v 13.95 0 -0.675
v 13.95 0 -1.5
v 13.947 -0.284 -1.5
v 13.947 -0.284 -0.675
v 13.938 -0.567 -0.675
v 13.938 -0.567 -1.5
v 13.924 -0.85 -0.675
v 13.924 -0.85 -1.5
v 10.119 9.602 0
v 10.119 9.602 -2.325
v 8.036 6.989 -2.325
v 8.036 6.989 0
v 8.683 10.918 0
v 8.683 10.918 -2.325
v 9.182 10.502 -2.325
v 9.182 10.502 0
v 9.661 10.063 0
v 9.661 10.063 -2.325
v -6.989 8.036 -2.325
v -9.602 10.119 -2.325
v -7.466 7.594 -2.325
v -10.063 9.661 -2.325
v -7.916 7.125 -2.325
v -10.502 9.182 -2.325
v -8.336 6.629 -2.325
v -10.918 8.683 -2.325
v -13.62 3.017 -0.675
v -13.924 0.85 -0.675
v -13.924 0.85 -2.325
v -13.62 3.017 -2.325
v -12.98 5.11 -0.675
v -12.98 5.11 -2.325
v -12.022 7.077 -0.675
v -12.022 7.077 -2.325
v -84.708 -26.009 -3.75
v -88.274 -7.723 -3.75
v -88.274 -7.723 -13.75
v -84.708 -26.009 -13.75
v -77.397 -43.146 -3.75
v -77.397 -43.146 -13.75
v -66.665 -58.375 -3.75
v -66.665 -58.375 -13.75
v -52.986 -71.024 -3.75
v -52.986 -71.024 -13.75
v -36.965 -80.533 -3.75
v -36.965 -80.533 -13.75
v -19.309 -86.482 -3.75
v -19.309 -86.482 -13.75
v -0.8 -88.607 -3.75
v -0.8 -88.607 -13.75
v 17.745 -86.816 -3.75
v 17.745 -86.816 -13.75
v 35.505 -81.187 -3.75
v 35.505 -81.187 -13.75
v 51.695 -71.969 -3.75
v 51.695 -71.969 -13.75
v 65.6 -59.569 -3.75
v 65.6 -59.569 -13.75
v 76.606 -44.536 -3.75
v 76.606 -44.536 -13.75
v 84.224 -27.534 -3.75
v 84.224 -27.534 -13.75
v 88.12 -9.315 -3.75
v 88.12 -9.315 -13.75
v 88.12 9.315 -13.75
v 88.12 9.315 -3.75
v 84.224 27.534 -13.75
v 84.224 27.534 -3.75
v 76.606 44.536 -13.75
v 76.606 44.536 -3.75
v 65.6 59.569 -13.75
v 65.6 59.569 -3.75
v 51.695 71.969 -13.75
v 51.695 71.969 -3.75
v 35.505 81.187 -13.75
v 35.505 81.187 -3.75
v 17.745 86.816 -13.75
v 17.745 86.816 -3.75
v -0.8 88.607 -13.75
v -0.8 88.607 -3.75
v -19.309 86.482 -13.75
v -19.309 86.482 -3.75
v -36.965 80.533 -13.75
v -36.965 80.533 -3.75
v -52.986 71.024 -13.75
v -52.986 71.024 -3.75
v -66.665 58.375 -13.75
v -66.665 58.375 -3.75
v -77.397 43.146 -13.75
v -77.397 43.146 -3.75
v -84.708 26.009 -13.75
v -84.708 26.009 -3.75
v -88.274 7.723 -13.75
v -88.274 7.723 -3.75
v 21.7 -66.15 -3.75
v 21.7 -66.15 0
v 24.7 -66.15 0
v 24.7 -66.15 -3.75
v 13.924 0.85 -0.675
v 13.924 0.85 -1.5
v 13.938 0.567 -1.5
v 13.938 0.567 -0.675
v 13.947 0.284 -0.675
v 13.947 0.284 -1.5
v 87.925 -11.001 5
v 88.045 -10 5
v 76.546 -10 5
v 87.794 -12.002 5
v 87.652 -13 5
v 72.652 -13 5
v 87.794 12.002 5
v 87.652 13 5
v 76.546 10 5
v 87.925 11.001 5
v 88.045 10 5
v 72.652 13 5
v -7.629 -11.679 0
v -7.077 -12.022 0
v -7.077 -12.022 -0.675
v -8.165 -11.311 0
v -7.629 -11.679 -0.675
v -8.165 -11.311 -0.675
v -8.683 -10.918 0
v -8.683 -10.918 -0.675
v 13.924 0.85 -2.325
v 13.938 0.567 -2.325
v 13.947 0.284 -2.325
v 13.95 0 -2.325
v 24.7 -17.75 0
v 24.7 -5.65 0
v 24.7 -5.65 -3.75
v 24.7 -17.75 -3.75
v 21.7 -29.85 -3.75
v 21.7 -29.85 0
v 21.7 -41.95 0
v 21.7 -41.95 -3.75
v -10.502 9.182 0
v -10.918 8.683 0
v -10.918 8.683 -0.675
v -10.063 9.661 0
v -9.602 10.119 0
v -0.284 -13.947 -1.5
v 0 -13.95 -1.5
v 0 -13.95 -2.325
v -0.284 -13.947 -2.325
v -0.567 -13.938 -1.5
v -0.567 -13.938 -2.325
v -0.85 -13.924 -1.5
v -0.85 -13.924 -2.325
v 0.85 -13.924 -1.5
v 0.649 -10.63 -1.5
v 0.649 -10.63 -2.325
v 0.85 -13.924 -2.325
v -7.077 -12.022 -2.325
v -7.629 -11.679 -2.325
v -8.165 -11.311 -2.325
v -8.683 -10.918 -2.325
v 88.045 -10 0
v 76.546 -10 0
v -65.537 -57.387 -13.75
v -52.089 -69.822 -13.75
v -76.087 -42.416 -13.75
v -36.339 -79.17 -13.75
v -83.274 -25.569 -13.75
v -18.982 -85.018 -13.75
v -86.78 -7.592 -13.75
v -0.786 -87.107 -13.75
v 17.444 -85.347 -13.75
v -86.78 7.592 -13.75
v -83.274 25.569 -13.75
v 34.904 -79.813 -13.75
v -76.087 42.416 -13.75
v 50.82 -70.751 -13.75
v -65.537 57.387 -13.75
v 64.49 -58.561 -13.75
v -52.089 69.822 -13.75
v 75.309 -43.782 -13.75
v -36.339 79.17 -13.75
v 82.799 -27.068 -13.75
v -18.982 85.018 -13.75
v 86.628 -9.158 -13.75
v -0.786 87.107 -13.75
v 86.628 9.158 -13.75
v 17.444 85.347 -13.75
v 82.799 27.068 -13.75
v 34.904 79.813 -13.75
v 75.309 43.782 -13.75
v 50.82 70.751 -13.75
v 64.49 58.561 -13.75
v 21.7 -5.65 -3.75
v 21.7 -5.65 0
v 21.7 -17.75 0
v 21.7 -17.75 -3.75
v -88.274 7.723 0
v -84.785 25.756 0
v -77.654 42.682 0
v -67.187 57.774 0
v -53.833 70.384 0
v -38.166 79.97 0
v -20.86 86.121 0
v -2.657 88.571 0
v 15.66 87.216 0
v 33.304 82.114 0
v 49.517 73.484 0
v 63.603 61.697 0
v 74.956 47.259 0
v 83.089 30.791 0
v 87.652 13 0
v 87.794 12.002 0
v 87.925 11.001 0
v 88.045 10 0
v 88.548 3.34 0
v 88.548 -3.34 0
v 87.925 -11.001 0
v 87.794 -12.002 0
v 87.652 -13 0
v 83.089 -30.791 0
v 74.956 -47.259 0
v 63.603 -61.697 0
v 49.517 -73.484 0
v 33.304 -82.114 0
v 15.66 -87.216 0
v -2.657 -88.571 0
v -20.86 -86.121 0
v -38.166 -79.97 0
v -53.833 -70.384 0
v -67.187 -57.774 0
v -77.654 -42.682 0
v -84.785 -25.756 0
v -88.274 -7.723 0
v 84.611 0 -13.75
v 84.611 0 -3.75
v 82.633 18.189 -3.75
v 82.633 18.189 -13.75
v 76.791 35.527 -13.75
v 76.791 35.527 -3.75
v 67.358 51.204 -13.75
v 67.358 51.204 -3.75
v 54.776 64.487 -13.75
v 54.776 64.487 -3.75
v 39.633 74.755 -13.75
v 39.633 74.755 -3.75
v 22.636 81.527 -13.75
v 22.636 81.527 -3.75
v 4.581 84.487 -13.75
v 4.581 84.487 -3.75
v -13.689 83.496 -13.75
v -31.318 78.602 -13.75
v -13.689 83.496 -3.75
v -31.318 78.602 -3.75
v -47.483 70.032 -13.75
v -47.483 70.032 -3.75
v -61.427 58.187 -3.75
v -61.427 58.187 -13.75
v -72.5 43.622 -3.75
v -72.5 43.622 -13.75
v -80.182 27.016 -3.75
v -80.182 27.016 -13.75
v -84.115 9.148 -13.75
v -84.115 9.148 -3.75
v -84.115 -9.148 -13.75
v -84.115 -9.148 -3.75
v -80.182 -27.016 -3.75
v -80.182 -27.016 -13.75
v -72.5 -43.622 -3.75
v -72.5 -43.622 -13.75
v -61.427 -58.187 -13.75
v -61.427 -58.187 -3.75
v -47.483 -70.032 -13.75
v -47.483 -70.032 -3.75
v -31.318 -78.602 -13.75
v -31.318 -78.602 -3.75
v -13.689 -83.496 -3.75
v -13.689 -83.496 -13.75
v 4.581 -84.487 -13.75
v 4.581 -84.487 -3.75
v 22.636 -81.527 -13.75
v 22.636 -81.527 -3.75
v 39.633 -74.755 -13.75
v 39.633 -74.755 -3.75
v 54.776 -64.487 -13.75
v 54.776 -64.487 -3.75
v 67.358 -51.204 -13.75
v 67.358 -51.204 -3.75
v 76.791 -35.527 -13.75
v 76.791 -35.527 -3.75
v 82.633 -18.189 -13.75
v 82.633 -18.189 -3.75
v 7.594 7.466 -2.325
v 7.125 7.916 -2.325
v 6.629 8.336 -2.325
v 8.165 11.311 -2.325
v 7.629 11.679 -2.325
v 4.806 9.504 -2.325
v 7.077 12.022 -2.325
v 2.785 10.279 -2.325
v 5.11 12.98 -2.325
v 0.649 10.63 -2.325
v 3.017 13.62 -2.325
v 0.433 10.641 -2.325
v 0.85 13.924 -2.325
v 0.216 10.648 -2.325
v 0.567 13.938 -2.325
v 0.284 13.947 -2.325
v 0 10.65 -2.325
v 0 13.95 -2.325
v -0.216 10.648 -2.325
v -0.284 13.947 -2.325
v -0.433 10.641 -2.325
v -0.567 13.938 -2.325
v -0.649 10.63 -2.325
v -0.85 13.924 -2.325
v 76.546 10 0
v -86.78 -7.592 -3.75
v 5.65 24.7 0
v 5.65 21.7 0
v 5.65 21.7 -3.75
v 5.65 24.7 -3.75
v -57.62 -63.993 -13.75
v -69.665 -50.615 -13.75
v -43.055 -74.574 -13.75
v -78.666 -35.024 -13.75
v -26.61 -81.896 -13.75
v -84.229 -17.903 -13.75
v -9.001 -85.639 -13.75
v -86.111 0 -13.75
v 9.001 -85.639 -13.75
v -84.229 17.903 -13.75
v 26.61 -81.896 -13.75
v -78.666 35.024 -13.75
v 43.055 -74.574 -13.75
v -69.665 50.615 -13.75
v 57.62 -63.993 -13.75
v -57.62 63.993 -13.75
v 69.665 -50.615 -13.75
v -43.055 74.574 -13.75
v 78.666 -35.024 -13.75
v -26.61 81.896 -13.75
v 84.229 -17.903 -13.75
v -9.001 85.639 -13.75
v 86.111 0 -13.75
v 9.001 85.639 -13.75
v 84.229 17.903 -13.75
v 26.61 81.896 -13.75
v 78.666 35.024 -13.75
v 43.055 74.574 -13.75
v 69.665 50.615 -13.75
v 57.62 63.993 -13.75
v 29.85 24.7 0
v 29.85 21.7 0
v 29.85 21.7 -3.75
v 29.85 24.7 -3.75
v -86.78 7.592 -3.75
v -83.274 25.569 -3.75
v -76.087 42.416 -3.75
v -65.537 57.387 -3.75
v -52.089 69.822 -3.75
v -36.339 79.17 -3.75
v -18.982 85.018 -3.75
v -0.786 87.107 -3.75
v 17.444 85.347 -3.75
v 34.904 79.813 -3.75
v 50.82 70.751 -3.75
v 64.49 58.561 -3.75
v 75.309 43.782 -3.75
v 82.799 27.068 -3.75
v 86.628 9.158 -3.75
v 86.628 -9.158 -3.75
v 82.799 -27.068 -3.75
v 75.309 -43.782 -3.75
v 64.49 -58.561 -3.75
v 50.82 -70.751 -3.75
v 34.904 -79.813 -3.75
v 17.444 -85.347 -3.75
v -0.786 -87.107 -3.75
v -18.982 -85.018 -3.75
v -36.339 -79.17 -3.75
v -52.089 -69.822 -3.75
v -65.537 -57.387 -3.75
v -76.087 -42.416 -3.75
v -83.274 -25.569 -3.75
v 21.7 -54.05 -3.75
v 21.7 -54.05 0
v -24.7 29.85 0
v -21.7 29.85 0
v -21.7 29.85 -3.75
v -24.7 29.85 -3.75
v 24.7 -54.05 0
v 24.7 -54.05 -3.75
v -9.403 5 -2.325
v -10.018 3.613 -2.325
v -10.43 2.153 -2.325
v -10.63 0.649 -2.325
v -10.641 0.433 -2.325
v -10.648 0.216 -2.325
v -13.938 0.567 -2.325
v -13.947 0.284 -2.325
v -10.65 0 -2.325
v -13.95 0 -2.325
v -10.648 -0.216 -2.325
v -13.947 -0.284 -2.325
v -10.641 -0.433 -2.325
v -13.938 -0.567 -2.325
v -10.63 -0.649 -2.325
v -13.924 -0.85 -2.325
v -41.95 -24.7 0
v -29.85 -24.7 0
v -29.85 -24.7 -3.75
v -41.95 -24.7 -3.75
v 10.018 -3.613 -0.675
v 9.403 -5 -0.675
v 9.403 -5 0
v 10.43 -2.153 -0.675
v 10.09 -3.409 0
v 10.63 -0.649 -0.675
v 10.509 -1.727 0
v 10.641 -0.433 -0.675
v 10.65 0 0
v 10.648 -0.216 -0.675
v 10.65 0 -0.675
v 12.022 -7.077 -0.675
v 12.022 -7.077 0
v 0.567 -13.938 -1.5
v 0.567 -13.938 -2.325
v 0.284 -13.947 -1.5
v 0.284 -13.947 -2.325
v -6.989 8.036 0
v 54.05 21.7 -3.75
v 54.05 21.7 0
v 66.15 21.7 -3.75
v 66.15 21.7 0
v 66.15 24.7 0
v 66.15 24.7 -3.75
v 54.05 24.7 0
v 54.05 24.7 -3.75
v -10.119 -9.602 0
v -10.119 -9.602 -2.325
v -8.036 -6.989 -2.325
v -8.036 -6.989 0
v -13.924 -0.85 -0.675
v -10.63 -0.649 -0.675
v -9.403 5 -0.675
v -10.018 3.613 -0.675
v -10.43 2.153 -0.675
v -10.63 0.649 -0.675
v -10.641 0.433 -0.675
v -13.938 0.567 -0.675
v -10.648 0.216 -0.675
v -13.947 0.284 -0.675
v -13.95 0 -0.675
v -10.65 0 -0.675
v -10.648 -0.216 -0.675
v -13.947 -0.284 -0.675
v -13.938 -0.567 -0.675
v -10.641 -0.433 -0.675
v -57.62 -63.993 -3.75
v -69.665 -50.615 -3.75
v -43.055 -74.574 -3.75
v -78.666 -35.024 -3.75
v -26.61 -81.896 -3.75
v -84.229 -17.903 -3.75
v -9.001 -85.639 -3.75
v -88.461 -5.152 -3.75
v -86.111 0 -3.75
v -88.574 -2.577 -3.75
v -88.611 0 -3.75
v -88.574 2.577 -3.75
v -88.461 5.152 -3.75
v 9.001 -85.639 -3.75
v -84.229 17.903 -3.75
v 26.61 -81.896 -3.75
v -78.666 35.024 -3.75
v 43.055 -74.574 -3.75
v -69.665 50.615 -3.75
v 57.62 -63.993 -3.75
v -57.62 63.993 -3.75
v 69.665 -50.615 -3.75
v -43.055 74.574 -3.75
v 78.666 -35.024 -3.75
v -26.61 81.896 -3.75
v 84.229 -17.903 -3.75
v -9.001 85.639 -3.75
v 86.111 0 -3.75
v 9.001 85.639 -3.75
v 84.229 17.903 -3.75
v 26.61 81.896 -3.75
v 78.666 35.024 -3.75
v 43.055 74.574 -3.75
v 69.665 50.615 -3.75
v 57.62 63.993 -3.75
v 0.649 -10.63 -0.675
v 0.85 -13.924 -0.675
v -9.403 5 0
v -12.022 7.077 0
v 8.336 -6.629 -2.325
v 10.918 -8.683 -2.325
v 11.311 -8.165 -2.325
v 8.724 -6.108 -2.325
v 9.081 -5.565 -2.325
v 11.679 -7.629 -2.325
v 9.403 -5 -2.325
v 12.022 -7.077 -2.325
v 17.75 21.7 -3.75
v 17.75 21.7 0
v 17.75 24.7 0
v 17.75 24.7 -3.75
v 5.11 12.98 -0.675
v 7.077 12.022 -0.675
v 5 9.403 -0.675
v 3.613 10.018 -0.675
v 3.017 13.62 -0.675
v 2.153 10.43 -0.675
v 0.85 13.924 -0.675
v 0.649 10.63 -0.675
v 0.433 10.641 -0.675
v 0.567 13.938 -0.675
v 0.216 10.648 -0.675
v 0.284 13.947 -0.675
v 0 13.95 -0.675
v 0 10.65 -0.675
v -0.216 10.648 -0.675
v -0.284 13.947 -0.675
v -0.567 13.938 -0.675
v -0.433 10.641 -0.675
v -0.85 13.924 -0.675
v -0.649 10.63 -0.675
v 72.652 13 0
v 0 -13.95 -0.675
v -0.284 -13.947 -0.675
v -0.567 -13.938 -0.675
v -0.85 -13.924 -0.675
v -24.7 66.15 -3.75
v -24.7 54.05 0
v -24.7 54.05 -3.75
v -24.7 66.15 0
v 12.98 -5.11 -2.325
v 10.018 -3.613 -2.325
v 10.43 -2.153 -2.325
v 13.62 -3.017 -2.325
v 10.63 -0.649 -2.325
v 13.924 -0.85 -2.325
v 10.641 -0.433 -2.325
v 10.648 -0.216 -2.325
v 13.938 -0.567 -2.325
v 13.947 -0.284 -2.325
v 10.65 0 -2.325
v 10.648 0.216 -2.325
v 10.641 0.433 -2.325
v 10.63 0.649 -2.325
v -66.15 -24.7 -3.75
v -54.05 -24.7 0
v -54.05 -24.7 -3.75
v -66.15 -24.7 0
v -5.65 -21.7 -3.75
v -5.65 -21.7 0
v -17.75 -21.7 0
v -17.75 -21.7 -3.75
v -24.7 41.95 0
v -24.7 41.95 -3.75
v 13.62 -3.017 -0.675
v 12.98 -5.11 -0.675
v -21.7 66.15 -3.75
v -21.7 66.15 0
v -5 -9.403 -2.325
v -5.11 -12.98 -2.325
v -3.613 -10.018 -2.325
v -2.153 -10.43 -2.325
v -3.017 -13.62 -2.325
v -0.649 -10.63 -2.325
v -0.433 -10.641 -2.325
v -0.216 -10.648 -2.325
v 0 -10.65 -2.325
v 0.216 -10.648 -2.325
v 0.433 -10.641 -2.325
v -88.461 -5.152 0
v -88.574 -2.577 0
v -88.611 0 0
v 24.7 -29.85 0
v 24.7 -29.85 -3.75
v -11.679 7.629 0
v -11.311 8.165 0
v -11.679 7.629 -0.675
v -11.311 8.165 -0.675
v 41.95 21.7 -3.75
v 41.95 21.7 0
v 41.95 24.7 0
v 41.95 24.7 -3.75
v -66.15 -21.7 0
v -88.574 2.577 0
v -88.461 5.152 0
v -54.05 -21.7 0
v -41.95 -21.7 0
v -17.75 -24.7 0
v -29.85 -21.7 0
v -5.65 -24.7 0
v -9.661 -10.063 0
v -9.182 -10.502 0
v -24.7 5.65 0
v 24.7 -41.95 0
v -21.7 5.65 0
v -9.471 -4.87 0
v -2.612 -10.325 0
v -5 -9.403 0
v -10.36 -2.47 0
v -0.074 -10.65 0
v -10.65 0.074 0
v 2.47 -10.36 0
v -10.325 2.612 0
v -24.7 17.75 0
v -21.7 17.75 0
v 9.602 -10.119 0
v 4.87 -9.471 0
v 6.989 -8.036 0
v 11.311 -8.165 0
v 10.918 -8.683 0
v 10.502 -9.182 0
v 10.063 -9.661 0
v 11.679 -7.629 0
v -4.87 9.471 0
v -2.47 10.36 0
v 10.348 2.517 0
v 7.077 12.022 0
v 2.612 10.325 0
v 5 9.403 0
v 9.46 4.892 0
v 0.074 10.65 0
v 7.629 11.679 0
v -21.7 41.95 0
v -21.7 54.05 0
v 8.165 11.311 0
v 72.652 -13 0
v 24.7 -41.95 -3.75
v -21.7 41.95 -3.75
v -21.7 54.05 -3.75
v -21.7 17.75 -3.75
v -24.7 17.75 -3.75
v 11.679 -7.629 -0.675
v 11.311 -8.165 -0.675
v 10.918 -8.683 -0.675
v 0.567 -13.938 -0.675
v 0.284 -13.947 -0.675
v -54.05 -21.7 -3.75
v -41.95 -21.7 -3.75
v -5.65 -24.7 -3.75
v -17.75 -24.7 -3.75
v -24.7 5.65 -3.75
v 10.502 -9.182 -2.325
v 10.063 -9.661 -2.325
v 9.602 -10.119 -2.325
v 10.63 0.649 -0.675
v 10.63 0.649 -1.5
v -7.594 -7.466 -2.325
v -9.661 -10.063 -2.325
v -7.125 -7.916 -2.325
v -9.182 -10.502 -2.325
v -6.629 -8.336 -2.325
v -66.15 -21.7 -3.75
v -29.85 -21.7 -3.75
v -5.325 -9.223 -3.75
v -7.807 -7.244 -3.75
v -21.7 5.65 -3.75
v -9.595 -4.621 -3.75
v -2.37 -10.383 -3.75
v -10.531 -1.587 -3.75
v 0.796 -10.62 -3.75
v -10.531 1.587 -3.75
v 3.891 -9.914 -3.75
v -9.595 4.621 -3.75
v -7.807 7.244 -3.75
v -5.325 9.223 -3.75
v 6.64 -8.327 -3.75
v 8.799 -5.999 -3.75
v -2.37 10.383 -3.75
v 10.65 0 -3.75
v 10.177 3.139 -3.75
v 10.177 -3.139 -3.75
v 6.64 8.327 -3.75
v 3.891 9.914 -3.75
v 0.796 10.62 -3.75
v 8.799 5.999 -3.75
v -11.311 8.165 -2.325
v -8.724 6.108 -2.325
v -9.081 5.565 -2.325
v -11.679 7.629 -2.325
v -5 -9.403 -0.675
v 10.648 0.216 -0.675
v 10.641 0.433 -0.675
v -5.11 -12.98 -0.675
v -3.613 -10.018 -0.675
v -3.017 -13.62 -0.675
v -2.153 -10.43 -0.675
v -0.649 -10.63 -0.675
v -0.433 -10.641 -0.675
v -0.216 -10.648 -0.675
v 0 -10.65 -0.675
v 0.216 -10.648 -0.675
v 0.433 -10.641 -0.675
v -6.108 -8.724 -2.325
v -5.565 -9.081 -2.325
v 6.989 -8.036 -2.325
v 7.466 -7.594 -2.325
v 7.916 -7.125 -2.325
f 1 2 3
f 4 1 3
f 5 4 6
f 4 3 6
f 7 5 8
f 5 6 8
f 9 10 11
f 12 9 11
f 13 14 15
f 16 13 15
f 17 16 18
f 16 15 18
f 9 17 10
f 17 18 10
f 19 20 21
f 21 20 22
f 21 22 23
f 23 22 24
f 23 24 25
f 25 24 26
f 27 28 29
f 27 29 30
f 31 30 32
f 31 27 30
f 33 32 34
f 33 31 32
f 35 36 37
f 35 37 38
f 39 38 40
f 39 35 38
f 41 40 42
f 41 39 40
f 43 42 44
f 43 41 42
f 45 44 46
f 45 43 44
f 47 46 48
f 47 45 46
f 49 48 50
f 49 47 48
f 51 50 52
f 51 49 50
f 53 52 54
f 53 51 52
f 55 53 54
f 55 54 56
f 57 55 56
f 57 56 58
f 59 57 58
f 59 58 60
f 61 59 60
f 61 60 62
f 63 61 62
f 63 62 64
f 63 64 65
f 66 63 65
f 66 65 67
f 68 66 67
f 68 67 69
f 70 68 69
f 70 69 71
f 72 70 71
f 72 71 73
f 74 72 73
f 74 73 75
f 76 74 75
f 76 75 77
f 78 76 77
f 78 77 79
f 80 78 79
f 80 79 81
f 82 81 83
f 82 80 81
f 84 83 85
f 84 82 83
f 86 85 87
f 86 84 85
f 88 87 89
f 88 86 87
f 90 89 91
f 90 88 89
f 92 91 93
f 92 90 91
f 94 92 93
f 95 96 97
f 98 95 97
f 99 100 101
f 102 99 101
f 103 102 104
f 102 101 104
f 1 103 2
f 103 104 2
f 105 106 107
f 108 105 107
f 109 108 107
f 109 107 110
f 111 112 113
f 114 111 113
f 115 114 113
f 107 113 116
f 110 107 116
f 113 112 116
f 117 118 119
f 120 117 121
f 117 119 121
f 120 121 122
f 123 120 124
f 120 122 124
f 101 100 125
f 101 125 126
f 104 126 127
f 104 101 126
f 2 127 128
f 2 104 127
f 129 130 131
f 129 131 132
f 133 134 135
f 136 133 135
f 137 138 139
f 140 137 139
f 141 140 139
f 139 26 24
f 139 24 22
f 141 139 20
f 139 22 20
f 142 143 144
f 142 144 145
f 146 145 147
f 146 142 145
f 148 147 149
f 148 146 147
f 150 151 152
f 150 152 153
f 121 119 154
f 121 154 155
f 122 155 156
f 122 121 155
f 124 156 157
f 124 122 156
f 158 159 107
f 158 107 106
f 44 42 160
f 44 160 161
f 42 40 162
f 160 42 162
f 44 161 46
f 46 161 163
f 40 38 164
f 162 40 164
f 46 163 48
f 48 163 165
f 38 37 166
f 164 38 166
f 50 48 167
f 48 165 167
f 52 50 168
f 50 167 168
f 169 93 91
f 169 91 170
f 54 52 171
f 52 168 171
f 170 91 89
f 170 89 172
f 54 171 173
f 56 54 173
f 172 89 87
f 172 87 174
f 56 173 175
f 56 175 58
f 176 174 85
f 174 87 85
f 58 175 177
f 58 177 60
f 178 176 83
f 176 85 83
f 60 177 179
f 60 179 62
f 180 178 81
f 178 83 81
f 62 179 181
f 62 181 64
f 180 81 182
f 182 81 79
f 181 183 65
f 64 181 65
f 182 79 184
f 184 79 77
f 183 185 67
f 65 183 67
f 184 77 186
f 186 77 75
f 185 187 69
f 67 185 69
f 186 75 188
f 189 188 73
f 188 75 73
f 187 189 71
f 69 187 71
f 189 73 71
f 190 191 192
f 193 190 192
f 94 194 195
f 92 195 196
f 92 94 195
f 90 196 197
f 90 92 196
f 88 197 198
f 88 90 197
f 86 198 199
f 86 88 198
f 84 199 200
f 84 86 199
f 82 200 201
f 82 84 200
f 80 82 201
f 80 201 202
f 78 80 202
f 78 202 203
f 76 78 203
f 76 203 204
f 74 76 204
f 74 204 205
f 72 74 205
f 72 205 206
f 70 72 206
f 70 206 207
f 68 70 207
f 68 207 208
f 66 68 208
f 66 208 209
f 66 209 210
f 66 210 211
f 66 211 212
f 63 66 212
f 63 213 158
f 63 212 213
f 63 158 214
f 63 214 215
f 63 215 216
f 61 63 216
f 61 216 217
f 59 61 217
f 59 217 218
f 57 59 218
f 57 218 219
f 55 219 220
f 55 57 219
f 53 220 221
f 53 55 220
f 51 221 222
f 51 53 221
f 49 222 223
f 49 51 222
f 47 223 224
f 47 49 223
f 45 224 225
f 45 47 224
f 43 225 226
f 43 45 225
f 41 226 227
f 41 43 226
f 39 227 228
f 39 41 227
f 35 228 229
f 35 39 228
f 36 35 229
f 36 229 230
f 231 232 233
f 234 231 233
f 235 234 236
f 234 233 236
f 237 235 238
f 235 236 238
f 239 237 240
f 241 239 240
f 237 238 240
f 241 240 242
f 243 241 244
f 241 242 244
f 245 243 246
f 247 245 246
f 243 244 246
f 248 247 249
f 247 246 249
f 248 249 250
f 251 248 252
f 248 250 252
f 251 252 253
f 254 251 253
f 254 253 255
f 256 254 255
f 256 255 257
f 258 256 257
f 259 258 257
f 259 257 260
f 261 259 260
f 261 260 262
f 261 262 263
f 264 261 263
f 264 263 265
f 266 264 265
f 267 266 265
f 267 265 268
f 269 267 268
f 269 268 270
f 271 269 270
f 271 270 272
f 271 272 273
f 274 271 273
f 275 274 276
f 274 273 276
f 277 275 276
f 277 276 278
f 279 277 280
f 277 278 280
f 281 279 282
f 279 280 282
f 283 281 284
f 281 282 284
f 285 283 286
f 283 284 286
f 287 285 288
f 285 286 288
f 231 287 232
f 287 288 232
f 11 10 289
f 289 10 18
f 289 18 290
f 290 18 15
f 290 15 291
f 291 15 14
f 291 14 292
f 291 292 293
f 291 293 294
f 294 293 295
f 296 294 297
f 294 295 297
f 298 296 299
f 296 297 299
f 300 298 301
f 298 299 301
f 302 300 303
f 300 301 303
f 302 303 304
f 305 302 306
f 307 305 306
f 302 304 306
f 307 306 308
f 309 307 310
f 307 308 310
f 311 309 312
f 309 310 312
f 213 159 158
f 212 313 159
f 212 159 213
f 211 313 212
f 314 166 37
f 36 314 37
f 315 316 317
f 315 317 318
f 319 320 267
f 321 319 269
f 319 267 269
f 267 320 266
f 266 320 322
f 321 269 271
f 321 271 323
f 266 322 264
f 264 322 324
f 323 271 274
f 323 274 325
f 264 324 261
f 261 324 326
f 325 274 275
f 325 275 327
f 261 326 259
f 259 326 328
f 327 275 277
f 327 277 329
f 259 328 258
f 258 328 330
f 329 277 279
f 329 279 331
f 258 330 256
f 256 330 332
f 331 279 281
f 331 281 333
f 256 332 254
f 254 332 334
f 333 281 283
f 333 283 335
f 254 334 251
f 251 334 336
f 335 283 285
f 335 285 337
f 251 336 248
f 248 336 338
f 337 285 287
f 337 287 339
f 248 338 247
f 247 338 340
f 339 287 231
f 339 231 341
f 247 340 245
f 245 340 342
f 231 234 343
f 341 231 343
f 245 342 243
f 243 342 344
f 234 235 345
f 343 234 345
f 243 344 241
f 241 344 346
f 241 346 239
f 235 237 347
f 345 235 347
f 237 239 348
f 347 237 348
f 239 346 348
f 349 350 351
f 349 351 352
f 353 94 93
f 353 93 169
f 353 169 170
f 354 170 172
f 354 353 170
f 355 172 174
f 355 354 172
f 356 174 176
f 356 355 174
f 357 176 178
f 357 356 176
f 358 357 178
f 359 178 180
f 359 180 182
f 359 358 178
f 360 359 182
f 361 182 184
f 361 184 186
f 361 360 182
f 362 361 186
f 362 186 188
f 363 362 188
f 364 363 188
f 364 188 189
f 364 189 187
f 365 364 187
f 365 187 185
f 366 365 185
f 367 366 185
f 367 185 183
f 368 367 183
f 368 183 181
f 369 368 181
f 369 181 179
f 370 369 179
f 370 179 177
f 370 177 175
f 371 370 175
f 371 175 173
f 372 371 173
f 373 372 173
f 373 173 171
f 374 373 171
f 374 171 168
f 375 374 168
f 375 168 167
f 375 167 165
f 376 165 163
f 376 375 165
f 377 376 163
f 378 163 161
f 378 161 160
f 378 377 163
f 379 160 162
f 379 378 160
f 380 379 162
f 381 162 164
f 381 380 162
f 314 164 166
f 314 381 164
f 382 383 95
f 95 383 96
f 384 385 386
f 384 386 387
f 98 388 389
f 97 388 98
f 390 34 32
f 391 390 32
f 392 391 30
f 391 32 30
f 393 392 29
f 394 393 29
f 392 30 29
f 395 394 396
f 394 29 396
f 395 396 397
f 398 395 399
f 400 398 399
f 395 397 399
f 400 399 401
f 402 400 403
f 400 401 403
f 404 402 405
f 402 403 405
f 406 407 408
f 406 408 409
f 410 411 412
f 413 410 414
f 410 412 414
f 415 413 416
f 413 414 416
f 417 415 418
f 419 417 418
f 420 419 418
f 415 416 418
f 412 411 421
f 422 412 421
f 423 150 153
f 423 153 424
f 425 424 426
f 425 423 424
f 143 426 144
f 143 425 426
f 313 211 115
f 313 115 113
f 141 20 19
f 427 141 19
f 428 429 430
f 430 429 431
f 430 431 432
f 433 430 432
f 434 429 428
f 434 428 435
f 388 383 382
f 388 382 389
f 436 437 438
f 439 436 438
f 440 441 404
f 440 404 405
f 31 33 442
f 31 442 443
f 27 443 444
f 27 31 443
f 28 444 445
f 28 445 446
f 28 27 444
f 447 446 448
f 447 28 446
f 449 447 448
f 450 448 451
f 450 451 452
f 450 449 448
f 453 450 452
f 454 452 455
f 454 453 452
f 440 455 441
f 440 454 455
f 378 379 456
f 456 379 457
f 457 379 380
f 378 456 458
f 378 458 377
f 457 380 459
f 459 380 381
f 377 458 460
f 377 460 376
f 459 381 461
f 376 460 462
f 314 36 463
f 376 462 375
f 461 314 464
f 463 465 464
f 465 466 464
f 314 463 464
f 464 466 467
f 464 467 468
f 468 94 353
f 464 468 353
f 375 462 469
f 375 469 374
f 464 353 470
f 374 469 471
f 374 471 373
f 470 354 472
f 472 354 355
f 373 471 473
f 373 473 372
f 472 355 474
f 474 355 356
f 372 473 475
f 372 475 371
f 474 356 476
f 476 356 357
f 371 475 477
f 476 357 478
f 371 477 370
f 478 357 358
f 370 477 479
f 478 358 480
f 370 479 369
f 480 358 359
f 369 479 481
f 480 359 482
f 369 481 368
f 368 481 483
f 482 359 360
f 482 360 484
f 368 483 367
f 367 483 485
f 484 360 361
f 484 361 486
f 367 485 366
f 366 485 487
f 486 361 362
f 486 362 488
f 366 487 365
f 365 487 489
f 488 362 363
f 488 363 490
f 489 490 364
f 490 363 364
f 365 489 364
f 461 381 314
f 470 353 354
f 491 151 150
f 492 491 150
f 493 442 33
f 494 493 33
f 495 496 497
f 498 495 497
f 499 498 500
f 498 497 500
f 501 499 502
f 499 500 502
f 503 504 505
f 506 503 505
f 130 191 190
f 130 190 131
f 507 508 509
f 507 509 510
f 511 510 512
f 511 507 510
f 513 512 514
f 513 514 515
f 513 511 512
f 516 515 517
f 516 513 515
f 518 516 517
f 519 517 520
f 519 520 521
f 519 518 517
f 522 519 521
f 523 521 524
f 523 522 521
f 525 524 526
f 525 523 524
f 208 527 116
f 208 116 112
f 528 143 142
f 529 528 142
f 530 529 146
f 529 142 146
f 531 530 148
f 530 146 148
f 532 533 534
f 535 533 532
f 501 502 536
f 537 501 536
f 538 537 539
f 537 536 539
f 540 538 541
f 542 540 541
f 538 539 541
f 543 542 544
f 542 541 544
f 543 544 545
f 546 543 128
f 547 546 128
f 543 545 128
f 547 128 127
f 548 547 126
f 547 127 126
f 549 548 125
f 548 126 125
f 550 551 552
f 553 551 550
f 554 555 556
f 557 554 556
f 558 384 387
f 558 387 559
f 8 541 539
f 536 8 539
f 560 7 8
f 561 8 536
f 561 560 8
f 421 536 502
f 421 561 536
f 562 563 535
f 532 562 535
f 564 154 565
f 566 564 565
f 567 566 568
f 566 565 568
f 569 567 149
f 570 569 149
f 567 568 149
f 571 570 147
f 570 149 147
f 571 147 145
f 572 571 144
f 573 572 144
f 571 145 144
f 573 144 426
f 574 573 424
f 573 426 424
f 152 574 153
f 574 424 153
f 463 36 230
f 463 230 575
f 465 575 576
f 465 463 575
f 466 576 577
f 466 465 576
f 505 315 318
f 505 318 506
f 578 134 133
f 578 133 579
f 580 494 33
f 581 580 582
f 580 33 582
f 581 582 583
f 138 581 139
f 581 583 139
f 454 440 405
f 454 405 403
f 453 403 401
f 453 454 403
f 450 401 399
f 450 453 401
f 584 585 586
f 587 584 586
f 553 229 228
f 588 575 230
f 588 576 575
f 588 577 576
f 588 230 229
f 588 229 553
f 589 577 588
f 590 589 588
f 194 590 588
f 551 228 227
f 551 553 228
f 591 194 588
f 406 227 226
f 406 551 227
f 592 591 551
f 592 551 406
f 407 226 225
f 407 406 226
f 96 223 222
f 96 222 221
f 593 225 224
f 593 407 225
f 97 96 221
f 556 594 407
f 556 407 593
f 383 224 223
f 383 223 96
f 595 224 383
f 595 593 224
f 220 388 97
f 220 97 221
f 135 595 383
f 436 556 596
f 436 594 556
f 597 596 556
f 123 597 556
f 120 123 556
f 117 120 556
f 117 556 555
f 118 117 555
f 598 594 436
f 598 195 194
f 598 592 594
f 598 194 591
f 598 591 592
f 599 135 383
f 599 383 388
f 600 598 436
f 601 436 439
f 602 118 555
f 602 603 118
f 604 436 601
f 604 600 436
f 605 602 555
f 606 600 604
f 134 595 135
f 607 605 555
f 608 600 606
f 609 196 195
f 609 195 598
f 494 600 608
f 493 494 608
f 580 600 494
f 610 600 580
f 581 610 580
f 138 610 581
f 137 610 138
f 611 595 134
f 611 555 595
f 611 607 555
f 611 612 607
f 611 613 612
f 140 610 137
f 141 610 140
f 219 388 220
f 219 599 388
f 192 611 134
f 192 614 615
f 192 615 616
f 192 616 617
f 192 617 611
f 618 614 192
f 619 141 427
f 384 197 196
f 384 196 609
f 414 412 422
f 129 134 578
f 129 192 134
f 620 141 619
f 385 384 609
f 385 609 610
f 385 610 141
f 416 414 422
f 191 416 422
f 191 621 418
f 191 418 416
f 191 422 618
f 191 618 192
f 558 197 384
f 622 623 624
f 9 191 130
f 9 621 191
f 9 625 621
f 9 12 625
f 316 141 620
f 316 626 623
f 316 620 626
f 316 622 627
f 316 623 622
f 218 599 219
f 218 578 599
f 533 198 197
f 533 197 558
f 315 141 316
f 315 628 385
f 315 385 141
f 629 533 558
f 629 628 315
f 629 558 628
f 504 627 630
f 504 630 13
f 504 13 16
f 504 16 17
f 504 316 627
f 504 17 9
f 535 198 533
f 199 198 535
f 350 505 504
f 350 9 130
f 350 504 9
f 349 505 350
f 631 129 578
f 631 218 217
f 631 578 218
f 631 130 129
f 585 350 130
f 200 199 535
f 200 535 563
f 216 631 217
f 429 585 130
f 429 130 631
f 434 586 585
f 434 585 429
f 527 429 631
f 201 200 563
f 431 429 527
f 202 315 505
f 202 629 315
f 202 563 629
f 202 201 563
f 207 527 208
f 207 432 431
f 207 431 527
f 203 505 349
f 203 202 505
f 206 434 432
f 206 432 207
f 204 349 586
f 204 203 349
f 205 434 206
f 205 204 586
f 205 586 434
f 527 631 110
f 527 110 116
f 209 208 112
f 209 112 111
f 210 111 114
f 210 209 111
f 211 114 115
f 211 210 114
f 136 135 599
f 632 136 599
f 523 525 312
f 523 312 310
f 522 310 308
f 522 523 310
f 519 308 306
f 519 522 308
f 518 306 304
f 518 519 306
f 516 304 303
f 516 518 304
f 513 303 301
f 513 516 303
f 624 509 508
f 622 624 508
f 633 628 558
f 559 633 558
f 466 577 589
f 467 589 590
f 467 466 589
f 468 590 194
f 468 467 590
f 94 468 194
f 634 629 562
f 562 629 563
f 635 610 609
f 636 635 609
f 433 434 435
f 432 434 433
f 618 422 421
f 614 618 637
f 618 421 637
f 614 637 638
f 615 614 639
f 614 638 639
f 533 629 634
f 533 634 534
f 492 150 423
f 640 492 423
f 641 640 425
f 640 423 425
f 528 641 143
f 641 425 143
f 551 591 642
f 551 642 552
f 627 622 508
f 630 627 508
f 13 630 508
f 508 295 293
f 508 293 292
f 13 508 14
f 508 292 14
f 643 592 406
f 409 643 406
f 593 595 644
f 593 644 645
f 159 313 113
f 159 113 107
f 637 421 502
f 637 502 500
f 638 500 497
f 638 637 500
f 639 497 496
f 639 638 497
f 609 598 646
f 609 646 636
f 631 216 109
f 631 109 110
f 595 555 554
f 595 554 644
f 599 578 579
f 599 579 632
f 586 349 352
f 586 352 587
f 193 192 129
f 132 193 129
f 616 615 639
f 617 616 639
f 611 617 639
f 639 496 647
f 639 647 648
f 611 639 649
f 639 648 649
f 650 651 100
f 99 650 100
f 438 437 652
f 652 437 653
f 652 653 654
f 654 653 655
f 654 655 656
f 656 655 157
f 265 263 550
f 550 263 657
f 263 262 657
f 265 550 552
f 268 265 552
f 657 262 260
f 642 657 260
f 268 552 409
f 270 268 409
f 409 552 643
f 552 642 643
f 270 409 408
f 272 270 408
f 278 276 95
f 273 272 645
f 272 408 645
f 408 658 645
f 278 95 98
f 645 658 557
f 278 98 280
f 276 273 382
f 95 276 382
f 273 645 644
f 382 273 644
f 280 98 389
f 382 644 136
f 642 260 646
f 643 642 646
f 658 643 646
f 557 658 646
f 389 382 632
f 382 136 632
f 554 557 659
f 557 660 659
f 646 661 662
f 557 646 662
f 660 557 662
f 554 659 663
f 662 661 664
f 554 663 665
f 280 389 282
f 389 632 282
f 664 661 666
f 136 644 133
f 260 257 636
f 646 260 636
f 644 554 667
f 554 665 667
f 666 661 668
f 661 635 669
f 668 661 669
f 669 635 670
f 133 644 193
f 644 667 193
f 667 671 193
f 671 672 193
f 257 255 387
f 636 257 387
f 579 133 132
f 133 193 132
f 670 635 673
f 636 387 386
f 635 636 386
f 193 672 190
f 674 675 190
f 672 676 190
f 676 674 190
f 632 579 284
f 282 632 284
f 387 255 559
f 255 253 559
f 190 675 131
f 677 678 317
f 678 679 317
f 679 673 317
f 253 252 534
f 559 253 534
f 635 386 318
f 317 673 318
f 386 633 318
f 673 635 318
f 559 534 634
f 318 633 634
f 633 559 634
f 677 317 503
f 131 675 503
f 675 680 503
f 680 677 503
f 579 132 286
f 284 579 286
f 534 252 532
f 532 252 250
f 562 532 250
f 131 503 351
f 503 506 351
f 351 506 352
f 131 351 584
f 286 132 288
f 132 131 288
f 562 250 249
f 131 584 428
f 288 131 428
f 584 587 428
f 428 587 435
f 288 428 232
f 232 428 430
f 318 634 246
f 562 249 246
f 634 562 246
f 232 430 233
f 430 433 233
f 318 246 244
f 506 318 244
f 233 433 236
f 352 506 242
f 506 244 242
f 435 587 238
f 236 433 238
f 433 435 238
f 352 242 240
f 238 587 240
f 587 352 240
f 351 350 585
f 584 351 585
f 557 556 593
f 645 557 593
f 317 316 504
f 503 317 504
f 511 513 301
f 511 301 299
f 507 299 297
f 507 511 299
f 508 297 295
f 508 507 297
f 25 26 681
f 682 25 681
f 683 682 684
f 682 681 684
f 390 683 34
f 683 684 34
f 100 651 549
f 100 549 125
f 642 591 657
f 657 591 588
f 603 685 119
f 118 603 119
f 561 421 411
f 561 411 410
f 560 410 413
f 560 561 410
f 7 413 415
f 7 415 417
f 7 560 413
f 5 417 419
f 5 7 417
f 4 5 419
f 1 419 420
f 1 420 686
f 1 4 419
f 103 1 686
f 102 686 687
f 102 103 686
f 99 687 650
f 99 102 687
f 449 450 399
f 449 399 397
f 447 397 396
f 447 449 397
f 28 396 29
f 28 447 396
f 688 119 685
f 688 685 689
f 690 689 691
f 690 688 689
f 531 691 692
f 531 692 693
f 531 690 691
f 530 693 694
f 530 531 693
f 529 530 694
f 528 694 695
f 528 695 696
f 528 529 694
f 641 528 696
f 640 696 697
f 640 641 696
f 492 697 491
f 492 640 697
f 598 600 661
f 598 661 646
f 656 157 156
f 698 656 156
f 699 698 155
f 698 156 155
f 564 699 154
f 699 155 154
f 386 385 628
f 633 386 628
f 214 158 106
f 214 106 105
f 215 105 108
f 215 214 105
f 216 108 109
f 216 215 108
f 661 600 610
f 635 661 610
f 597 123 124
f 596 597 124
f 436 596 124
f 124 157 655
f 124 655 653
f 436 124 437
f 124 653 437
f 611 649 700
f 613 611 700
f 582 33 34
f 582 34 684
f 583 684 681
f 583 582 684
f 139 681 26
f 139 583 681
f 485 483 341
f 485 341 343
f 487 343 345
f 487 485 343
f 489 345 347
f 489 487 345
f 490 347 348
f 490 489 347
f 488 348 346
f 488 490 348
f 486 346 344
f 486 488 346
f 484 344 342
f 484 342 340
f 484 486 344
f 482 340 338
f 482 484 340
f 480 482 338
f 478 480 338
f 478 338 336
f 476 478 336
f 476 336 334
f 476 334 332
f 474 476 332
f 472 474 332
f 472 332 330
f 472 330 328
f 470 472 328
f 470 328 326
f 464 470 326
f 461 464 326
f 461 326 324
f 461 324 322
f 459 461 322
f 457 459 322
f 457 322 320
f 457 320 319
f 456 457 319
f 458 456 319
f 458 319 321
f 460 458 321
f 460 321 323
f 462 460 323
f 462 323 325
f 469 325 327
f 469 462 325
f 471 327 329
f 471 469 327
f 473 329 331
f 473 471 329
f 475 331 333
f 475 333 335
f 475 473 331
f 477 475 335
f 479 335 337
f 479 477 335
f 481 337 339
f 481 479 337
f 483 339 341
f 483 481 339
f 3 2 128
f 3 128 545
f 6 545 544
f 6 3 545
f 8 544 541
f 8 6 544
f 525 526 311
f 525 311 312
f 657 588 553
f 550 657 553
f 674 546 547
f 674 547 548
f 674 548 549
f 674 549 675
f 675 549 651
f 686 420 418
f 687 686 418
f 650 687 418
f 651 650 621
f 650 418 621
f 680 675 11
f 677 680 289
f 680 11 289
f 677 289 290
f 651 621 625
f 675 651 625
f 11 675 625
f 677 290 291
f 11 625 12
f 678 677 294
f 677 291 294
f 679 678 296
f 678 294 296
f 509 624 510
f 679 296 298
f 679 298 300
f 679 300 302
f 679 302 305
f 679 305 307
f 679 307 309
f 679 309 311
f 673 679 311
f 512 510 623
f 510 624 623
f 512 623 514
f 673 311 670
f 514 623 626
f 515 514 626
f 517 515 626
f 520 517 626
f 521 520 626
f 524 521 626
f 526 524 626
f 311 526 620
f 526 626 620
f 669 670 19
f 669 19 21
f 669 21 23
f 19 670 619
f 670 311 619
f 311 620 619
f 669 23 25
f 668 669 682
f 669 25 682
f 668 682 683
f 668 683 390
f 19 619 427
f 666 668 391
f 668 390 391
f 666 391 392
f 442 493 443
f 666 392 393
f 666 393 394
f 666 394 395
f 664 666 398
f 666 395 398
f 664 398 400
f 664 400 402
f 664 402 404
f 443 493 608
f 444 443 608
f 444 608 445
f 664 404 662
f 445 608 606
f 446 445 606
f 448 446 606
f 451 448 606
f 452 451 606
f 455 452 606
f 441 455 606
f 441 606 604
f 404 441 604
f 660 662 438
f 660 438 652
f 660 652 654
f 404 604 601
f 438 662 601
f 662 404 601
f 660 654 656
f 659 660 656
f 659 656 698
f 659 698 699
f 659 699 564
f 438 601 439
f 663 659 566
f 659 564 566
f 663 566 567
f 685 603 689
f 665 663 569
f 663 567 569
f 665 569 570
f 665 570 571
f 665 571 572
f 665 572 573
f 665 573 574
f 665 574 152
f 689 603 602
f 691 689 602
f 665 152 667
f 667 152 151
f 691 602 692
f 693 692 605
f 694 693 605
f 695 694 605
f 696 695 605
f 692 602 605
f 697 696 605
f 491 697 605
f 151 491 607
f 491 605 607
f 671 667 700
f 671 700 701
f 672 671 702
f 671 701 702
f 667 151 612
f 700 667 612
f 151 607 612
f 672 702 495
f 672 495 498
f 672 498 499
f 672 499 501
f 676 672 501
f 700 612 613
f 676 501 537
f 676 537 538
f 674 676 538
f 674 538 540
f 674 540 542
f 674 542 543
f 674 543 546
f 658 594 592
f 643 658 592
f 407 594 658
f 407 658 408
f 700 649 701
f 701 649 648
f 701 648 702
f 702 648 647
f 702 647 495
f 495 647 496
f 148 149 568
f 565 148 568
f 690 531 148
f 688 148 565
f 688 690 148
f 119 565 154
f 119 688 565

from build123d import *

# Parameters (mm, degrees)
SKETCH1_W           = 200
SKETCH1_H           = 200
SKETCH1_R           = 10.65
BOSS_EXTRUDE1_DEPTH = 3.75
CUT_EXTRUDE4_START  = -1.5
CUT_EXTRUDE4_DEPTH  = 0.825
CUT_EXTRUDE5_DEPTH  = 3.325
CIRPATTERN1_COUNT   = 4
SKETCH5_W           = 12.1
SKETCH5_H           = 3
CUT_EXTRUDE6_DEPTH  = 10
CIRPATTERN2_COUNT   = 4
SKETCH6_W           = 200
SKETCH6_H           = 200.182674684
SKETCH6_R           = 88.610994186
CUT_EXTRUDE7_DEPTH  = 4.75
SKETCH8_R           = 86.110994186
SKETCH8_R_2         = 84.610994186
BOSS_EXTRUDE2_DEPTH = 13.75
BOSS_EXTRUDE3_DEPTH = 5


with BuildPart() as part:
    # Sketch1 → Boss-Extrude1 (new body)
    with BuildSketch(Plane.XY):
        Rectangle(SKETCH1_W, SKETCH1_H)
        Circle(SKETCH1_R, mode=Mode.SUBTRACT)
    extrude(amount=-BOSS_EXTRUDE1_DEPTH)

    # Sketch2 → Cut-Extrude4 (cut, symmetric)
    with BuildSketch(Plane.XY.offset(CUT_EXTRUDE4_START)):
        with BuildLine():
            Line((8.682868236, 10.918346907), (6.628856395, 8.335512155))
            ThreePointArc((6.628856395, 8.335512155), (3.815515862, 9.943054798), (0.648987911, 10.63020765))
            ThreePointArc((0.648987911, 10.63020765), (0.324644823, 10.645050763), (0, 10.65))
            ThreePointArc((0, 10.65), (-0.324644823, 10.645050763), (-0.648987911, 10.63020765))
            Line((-0.648987911, 10.63020765), (-0.850082756, 13.92407481))
            ThreePointArc((-0.850082756, 13.92407481), (-0.425238994, 13.943517196), (0, 13.95))
            ThreePointArc((0, 13.95), (0.425238994, 13.943517196), (0.850082756, 13.92407481))
            ThreePointArc((0.850082756, 13.92407481), (4.997788382, 13.024001355), (8.682868236, 10.918346907))
        make_face()
    cut_extrude4 = extrude(amount=CUT_EXTRUDE4_DEPTH, both=True, mode=Mode.SUBTRACT)

    # Sketch4 → Cut-Extrude5 (cut, through all)
    with BuildSketch(Plane.XY.offset(-2.325)):
        with BuildLine():
            Line((5.000342926, 9.403141529), (7.076920348, 12.021634597))
            ThreePointArc((7.076920348, 12.021634597), (7.89918002, 11.498063098), (8.682868236, 10.918346907))
            ThreePointArc((8.682868236, 10.918346907), (9.424158272, 10.285316761), (10.119430429, 9.602063726))
            Line((10.119430429, 9.602063726), (8.035757001, 6.989213791))
            ThreePointArc((8.035757001, 6.989213791), (7.363141404, 7.694585672), (6.628856395, 8.335512155))
            ThreePointArc((6.628856395, 8.335512155), (5.839051921, 8.906625212), (5.000342926, 9.403141529))
        make_face()
    cut_extrude5 = extrude(amount=CUT_EXTRUDE5_DEPTH, mode=Mode.SUBTRACT)

    # CirPattern1: Cut-Extrude4, Cut-Extrude5 ×4 about axis
    cirpattern1_axis = Axis((0, 0, 0), (0, 0, 1))
    for i in range(1, CIRPATTERN1_COUNT):
        add(cut_extrude4.rotate(cirpattern1_axis, i * 360 / CIRPATTERN1_COUNT), mode=Mode.SUBTRACT)
        add(cut_extrude5.rotate(cirpattern1_axis, i * 360 / CIRPATTERN1_COUNT), mode=Mode.SUBTRACT)

    # Sketch5 → Cut-Extrude6 (cut)
    with BuildSketch(Plane.XY):
        with Locations((35.9, 23.2)):
            Rectangle(SKETCH5_W, SKETCH5_H)
        with Locations((60.1, 23.2)):
            Rectangle(SKETCH5_W, SKETCH5_H)
        with Locations((11.7, 23.2)):
            Rectangle(SKETCH5_W, SKETCH5_H)
    cut_extrude6 = extrude(amount=-CUT_EXTRUDE6_DEPTH, mode=Mode.SUBTRACT)

    # CirPattern2: Cut-Extrude6 ×4 about axis
    cirpattern2_axis = Axis((0, 0, 0), (0, 0, 1))
    for i in range(1, CIRPATTERN2_COUNT):
        add(cut_extrude6.rotate(cirpattern2_axis, i * 360 / CIRPATTERN2_COUNT), mode=Mode.SUBTRACT)

    # Sketch6 → Cut-Extrude7 (cut, through all)
    with BuildSketch(Plane(origin=(0, 0, -3.75), x_dir=(-1, 0, 0), z_dir=(0, 0, -1))):
        with Locations((0, 0.091337342)):
            Rectangle(SKETCH6_W, SKETCH6_H)
        Circle(SKETCH6_R, mode=Mode.SUBTRACT)
    extrude(amount=-CUT_EXTRUDE7_DEPTH, mode=Mode.SUBTRACT)

    # Sketch8 → Boss-Extrude2 (add)
    with BuildSketch(Plane.XY):
        Circle(SKETCH8_R)
        Circle(SKETCH8_R_2, mode=Mode.SUBTRACT)
        with BuildLine():
            Line((-88.273802601, 7.722957014), (-86.779510554, 7.5922234))
            ThreePointArc((-86.779510554, 7.5922234), (87.110994186, 0), (-86.779510554, -7.5922234))
            Line((-86.779510554, -7.5922234), (-88.273802601, -7.722957014))
            ThreePointArc((-88.273802601, -7.722957014), (88.610994186, 0), (-88.273802601, 7.722957014))
        make_face()
    extrude(amount=-BOSS_EXTRUDE2_DEPTH)

    # Sketch11 → Boss-Extrude3 (add)
    with BuildSketch(Plane.XY):
        with BuildLine():
            Line((76.545964234, -10), (88.044922004, -10))
            ThreePointArc((88.044922004, -10), (87.861366557, -11.501676291), (87.652200718, -13))
            Line((87.652200718, -13), (72.652200718, -13))
            Line((72.652200718, -13), (72.652200718, 13))
            Line((72.652200718, 13), (87.652200718, 13))
            ThreePointArc((87.652200718, 13), (87.861366557, 11.501676291), (88.044922004, 10))
            Line((88.044922004, 10), (76.545964234, 10))
            Line((76.545964234, 10), (76.545964234, -10))
        make_face()
    extrude(amount=BOSS_EXTRUDE3_DEPTH)


solid = part.part
